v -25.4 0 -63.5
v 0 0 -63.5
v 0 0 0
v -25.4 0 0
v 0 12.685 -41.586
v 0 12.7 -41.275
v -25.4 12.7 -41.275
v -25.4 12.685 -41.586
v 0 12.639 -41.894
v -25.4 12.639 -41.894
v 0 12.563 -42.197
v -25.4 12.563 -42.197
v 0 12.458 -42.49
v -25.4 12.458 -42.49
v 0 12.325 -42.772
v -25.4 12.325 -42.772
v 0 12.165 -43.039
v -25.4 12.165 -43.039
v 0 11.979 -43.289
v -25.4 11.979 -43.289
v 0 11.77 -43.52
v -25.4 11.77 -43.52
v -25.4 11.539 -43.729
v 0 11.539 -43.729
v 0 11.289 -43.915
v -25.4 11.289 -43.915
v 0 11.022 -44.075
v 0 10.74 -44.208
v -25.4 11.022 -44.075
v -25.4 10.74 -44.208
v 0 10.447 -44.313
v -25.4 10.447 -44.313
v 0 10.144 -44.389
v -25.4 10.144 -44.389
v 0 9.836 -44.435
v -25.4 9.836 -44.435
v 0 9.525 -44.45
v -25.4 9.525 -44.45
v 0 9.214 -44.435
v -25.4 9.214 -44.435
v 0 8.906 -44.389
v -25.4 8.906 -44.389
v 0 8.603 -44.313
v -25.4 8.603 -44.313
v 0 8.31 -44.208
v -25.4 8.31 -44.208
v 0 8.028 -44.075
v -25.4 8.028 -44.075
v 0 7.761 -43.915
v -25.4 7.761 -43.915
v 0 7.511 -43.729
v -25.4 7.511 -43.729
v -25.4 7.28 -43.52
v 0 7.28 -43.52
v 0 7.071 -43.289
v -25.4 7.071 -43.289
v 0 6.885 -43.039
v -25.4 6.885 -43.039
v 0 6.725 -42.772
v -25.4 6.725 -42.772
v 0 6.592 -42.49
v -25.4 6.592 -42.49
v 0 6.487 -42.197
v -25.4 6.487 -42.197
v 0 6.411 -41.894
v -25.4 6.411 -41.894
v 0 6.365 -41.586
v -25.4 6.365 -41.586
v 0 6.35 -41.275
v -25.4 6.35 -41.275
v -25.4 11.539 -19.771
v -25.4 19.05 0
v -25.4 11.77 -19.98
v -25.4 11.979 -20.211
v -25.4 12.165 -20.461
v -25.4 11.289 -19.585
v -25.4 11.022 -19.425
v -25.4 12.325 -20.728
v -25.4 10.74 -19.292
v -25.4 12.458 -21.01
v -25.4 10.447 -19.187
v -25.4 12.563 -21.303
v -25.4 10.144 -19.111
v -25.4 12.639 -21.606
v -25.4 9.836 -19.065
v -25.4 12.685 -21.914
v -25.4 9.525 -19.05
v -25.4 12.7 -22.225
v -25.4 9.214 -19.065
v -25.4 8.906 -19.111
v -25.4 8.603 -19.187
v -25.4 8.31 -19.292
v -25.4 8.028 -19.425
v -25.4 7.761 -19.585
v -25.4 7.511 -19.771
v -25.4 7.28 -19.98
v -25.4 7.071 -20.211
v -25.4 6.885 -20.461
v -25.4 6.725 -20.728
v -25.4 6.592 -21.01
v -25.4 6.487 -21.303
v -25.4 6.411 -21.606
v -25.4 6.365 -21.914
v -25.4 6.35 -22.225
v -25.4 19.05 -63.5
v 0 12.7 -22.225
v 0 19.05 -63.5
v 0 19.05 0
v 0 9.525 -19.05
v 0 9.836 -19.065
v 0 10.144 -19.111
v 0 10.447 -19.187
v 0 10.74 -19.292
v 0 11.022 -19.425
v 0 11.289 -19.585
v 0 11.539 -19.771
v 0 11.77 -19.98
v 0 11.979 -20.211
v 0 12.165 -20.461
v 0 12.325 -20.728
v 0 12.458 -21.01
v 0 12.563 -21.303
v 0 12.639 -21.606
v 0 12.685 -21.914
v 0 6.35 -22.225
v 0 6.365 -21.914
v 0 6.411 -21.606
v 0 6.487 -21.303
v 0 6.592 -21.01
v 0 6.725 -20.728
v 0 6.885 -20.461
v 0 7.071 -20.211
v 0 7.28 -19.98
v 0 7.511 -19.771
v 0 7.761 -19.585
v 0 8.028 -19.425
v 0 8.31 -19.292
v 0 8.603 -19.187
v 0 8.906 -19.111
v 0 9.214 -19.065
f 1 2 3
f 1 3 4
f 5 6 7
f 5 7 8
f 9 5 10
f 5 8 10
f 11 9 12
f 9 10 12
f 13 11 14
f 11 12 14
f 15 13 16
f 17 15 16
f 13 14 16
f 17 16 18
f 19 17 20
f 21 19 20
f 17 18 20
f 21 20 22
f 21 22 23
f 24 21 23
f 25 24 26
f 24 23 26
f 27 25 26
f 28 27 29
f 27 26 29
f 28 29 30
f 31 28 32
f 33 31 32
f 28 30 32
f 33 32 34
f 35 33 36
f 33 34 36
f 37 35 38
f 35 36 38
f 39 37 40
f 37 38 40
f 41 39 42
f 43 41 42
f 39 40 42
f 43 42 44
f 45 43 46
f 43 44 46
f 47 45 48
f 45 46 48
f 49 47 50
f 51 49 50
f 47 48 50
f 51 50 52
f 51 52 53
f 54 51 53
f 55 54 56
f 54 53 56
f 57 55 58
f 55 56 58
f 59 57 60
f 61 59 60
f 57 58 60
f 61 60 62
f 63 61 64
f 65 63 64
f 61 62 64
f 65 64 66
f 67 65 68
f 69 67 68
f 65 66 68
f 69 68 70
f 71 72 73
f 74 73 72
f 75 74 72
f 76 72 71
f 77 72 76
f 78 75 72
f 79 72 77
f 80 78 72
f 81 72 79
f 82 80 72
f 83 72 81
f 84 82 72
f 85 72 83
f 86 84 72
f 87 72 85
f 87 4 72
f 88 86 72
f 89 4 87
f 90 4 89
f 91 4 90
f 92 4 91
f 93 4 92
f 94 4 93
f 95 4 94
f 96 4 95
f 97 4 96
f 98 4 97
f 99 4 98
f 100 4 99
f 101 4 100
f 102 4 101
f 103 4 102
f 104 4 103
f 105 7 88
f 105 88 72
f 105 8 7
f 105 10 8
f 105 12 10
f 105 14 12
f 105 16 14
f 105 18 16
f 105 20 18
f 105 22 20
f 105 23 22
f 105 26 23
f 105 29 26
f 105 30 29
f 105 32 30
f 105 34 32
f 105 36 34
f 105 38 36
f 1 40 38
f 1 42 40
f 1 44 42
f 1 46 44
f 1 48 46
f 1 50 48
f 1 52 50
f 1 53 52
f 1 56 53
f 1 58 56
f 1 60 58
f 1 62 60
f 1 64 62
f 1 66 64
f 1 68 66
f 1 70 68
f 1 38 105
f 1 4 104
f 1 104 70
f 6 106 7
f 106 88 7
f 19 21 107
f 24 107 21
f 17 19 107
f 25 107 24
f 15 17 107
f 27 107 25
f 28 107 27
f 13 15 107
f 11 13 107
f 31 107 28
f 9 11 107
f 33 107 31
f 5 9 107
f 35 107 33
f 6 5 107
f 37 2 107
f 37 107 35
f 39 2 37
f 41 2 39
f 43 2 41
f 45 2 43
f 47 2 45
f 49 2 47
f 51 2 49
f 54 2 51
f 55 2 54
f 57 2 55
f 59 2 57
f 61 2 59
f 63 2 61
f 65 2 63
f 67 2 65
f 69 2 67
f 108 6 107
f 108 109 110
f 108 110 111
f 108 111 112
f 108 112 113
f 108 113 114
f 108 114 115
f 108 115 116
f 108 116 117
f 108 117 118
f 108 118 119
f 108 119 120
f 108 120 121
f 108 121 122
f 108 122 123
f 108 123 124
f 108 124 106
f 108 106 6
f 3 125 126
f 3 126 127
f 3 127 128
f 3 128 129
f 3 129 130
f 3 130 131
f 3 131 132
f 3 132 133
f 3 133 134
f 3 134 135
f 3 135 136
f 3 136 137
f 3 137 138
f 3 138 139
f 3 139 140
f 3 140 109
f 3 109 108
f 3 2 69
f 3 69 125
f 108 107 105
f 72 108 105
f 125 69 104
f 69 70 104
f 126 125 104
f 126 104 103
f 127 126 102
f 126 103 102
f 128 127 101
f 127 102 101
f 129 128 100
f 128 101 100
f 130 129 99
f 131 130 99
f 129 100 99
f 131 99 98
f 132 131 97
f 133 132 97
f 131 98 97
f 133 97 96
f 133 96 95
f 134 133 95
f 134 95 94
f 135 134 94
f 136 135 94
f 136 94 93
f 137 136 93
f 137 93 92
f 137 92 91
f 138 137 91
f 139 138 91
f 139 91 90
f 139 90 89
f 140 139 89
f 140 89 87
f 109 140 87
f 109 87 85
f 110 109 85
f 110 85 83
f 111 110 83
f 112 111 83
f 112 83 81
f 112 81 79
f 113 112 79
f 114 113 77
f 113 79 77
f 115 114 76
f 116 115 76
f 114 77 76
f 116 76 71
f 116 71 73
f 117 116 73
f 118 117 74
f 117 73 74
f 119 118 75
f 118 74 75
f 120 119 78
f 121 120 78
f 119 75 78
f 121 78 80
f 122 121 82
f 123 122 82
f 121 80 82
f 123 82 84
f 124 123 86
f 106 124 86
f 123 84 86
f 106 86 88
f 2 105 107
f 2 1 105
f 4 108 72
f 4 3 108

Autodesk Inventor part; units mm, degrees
ref_plane "YZ Plane" through (0, 0, 0) normal (1, 0, 0) x (0, 1, 0)
ref_plane "XZ Plane" through (0, 0, 0) normal (0, 1, 0) x (-1, 0, 0)
ref_plane "XY Plane" through (0, 0, 0) normal (0, 0, 1) x (1, 0, 0)
sketch "tensioner_wood_block_base_sketch" plane through (0, 0, 0) normal (0, 1, 0) x (-1, 0, 0)
  line L0 (0, 0) -> (25.4, 0)
  line L1 (25.4, 0) -> (25.4, -63.5)
  line L2 (25.4, -63.5) -> (0, -63.5)
  line L3 (0, -63.5) -> (0, 0)
  dimension "d0" = 25.4
  dimension "d1" = 63.5
extrude "base_extrusion" add sketch "tensioner_wood_block_base_sketch" along normal blind 19.05
sketch "tensioner_sketch" plane through (-25.4, 0, -63.5) normal (-1, 0, 0) x (0, 0, 1)
  line L0 (41.275, 9.525) -> (22.225, 9.525) construction
  line L1 (41.275, 12.7) -> (22.225, 12.7)
  line L2 (22.225, 6.35) -> (41.275, 6.35)
  arc A0 (41.275, 6.35) -> (41.275, 12.7) centre (41.275, 9.525) ccw
  arc A1 (22.225, 12.7) -> (22.225, 6.35) centre (22.225, 9.525) ccw
  line L3 (63.5, 0) -> (63.5, 19.05) projected
  line L4 (63.5, 0) -> (0, 0) projected
  line L5 (31.75, 0) -> (31.75, 9.525) construction
  line L6 (31.75, 9.525) -> (31.75, 19.05) construction
  line L7 (0, 19.05) -> (63.5, 19.05) projected
  dimension "d4" = 22.225
  dimension "d5" = 19.05
  dimension "d6" = 6.35
extrude "tensioner" cut sketch "tensioner_sketch" against normal up to next
equation "\"d0\" = twb_width"
equation "\"d1\" = twb_height"
equation "\"d2\" = twb_length"
equation "\"d4\" = twb_tensioner_from_edge"
equation "\"d5\" = bp_tensioner_height"
equation "\"d6\" = bp_tensioner_width"
equation "\"d7\" = twb_length"
equation "\"bp_thickness\" = 3.048"
equation "\"bp_height\" = gb_mh_seperation + st_outer_diameter"
equation "\"bp_width\" = 6 * st_rivet_distance"
equation "\"bp_axle_height\" = magic_axle_offset + gb_axle_from_edge + gb_to_bottom_of_side_assembly"
equation "\"magic_axle_offset\" = 3.175"
equation "\"bp_tensioner_width\" = 6.35"
equation "\"bp_tensioner_height\" = 19.05"
equation "\"bp_tensioner_from_bottom\" = 50.8"
equation "\"bp_tensioner_from_side\" = 25.4"
equation "\"bp_tensioner_wood_mount_from_tensioner_top\" = 12.7"
equation "\"bp_tensioner_wood_mount_diameter\" = 6.35"
equation "\"gb_mh_seperation\" = 111.1504"
equation "\"gb_mh_diameter\" = 6.35"
equation "\"gb_axle_from_edge\" = 38.1"
equation "\"gb_width\" = 127"
equation "\"gb_bearing_diameter\" = 28.575"
equation "\"gb_to_bottom_of_side_assembly\" = 4.7752"
equation "\"rv_hole_diameter\" = 3.57187"
equation "\"st_outer_diameter\" = 25.4"
equation "\"st_wall_thickness\" = 6.35"
equation "\"st_length\" = 939.8"
equation "\"st_gbmh_from_center\" = 0.5 * gb_mh_seperation"
equation "\"st_cutout_depth_right\" = 342.9"
equation "\"st_cutout_depth_left\" = 342.9"
equation "\"st_rivet_distance\" = 19.05"
equation "\"so_inner_diameter\" = 6.35"
equation "\"so_wall_thickness\" = 3.048"
equation "\"so_length\" = 25.4"
equation "\"twb_width\" = st_outer_diameter"
equation "\"twb_length\" = bp_tensioner_width + 2 * twb_margin_on_each_side"
equation "\"twb_height\" = 2 * bp_tensioner_wood_mount_diameter + bp_tensioner_height + 2 * bp_tensioner_wood_mount_from_tensioner_top + twb_margin_on_each_side"
equation "\"twb_margin_on_each_side\" = 6.35"
equation "\"twb_tensioner_from_edge\" = -0.5 * bp_tensioner_height + 0.5 * twb_height"
properties part number "tensioner_wood_block(twb)" material "Wood (Oak)"
